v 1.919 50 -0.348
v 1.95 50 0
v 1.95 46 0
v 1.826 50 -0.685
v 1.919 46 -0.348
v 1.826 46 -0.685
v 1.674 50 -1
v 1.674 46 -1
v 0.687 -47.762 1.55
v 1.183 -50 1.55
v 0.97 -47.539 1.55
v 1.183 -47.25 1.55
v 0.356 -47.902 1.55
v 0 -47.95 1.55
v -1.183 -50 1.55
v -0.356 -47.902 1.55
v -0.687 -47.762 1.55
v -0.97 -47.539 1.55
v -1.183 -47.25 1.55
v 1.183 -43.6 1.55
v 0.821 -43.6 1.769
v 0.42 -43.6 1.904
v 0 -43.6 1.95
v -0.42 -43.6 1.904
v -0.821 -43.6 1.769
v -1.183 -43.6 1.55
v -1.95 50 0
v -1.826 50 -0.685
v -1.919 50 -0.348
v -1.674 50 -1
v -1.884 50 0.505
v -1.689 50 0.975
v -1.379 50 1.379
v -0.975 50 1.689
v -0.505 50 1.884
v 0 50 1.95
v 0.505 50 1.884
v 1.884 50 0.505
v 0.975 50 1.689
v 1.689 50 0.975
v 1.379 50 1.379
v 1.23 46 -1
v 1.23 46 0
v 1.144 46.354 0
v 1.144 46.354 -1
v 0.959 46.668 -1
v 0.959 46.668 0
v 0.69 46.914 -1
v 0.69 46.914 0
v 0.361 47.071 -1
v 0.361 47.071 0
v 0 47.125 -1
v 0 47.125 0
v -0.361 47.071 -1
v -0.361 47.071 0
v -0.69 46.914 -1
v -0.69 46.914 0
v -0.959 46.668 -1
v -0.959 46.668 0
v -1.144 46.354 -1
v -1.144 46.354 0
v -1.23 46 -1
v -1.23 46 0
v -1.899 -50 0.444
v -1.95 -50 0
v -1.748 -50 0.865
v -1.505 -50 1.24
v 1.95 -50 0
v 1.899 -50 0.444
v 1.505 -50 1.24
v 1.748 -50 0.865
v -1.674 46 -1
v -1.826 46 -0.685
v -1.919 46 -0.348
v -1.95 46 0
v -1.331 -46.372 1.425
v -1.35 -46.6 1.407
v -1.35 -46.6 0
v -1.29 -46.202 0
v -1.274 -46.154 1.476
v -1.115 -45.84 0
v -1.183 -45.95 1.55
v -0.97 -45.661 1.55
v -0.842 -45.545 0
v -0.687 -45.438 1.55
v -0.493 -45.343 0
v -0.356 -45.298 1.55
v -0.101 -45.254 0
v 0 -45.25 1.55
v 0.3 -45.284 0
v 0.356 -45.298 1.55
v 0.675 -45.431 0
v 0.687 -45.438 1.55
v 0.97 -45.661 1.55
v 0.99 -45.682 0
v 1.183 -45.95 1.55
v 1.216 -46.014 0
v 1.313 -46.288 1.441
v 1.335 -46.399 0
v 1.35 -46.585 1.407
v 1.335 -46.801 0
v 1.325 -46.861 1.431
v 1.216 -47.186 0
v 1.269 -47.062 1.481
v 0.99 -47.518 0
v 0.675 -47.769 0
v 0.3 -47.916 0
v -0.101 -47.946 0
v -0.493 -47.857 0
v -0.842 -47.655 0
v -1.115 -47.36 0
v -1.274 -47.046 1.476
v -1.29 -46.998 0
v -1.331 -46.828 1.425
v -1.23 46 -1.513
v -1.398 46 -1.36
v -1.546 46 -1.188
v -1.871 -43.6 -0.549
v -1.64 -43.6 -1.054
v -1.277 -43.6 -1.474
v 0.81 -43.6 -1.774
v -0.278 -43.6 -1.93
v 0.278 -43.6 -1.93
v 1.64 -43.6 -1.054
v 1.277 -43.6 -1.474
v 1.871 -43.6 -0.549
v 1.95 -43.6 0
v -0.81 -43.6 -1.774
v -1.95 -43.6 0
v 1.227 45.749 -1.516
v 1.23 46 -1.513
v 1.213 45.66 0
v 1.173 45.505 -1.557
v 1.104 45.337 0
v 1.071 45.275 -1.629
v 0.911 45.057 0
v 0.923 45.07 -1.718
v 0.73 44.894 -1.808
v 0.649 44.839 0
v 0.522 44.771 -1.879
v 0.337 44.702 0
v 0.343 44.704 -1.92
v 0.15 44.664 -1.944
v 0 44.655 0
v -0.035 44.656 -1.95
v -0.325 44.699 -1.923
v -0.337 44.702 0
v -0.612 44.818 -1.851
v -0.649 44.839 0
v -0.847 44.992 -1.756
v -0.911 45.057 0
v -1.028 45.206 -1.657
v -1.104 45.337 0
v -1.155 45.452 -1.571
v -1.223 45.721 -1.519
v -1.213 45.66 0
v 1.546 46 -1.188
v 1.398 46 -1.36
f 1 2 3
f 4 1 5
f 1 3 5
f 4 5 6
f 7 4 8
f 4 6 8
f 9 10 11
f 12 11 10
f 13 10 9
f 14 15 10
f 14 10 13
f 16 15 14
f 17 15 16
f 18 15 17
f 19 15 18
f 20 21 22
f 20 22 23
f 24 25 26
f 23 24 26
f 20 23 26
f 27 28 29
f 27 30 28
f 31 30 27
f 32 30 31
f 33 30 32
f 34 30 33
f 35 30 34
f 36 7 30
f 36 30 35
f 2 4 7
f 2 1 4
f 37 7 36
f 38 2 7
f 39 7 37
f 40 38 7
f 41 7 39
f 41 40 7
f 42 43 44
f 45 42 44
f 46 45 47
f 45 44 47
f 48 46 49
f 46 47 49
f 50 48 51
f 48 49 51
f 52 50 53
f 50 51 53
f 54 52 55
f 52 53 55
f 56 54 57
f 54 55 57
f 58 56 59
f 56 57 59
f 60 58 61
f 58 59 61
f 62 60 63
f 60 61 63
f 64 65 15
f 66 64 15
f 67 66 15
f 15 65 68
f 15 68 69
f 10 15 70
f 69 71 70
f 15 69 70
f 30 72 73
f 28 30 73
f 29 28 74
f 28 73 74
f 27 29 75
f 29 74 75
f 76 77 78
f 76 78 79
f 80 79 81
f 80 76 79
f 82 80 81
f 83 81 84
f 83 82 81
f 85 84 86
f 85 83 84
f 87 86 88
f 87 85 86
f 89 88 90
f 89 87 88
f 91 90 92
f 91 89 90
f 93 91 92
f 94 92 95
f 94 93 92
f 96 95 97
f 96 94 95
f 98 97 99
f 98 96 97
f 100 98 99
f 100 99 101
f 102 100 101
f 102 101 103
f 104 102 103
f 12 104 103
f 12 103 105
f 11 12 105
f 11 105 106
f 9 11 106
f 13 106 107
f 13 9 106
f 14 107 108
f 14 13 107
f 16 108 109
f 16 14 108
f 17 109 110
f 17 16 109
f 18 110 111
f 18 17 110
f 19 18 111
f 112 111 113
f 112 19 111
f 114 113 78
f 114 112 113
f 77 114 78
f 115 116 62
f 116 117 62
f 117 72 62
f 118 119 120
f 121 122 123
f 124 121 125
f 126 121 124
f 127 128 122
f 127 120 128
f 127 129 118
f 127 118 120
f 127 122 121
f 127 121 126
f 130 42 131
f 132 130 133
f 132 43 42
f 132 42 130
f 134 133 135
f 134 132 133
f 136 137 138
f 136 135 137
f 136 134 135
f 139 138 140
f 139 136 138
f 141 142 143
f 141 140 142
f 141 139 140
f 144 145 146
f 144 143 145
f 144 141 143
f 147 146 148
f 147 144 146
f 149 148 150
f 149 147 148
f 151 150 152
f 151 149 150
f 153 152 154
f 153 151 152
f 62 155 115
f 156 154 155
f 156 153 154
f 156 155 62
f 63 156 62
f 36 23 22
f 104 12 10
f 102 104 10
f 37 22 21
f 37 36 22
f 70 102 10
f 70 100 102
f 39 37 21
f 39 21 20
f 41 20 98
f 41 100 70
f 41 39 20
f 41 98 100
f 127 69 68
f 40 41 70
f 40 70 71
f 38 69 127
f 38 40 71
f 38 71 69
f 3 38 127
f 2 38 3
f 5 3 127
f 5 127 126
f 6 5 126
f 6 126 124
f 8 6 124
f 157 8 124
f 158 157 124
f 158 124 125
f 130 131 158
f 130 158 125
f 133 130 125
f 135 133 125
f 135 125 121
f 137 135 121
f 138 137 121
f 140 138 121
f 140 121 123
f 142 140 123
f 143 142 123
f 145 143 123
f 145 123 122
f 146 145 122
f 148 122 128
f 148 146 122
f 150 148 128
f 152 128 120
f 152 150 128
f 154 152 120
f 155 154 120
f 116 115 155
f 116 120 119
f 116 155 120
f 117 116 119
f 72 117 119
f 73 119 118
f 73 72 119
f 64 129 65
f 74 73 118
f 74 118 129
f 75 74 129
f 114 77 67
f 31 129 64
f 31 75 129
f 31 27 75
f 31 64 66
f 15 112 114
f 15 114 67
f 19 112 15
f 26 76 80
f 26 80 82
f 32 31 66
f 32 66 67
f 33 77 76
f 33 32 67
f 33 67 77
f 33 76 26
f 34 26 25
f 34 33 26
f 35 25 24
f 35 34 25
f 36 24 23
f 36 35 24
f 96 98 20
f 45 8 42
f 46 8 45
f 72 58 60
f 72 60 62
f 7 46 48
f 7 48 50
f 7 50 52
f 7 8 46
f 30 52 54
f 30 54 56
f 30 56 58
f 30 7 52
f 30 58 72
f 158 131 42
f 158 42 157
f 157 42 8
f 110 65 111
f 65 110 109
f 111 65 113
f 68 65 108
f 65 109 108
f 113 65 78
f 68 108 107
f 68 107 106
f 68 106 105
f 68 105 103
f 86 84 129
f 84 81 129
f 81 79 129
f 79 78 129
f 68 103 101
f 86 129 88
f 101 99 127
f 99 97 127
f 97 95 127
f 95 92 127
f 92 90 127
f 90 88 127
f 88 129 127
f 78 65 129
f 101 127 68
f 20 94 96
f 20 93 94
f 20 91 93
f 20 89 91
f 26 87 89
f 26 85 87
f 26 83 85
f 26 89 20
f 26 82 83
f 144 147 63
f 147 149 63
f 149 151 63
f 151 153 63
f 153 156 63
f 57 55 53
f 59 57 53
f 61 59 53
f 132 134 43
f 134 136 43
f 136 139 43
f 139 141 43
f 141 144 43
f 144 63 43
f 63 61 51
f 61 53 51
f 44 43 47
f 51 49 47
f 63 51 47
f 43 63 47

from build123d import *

# Parameters (mm, degrees)
SKETCH1_R               = 1.95
BOSS_EXTRUDE1_DEPTH     = 50
SKETCH2_W               = 3.9
SKETCH2_H               = 6.4
SKETCH2_H_2             = 4
CUT_EXTRUDE1_DEPTH      = 51.075992252
CUT_EXTRUDE2_DEPTH      = 51.075992252
CUT_EXTRUDE2_DEPTH_BACK = 51.075992252
SKETCH3_W               = 0.4
SKETCH3_H               = 6.4
CUT_EXTRUDE3_DEPTH      = 51.075992252
CUT_EXTRUDE3_DEPTH_BACK = 51.075992252
SKETCH4_R               = 1.35
SKETCH5_R               = 1.235
CUT_EXTRUDE4_DEPTH      = 51.075992359
BOSS_EXTRUDE2_DEPTH     = 1
CUT_EXTRUDE5_DEPTH      = 97.039601311


with BuildPart() as part:
    # Sketch1 → Boss-Extrude1 (new, symmetric)
    with BuildSketch(Plane(origin=(0, 0, 0), x_dir=(1, 0, 0), z_dir=(0, 1, 0))):
        with Locations(Location((0, 0, 0), (0, 0, 270))):
            Circle(SKETCH1_R)
    extrude(amount=BOSS_EXTRUDE1_DEPTH, both=True)

    # Sketch2 → Cut-Extrude1 (cut, through all)
    with BuildSketch(Plane.XY):
        with Locations((0, -46.8)):
            Rectangle(SKETCH2_W, SKETCH2_H)
        with Locations((0, 48)):
            Rectangle(SKETCH2_W, SKETCH2_H_2)
    extrude(amount=-CUT_EXTRUDE1_DEPTH, mode=Mode.SUBTRACT)

    # Sketch3 → Cut-Extrude2 (cut, two sides: drawn at the far end of the back side and taken through both)
    with BuildSketch(Plane(origin=(0, 0, 0), x_dir=(0, 0, -1), z_dir=(1, 0, 0)).offset(-CUT_EXTRUDE2_DEPTH_BACK)):
        with Locations((-1.75, -46.8)):
            Rectangle(SKETCH3_W, SKETCH3_H)
    extrude(amount=CUT_EXTRUDE2_DEPTH + CUT_EXTRUDE2_DEPTH_BACK, mode=Mode.SUBTRACT)

    # Sketch4 → Cut-Extrude3 (cut, two sides: drawn at the far end of the back side and taken through both)
    with BuildSketch(Plane(origin=(0, 0, 0), x_dir=(-1, 0, 0), z_dir=(0, 0, -1)).offset(-CUT_EXTRUDE3_DEPTH_BACK)):
        with Locations((0, -46.6)):
            Circle(SKETCH4_R)
    extrude(amount=CUT_EXTRUDE3_DEPTH + CUT_EXTRUDE3_DEPTH_BACK, mode=Mode.SUBTRACT)

    # Sketch5 → Cut-Extrude4 (cut, through all)
    with BuildSketch(Plane(origin=(0, 0, 0), x_dir=(-1, 0, 0), z_dir=(0, 0, -1))):
        with Locations((0, 45.89)):
            Circle(SKETCH5_R)
    extrude(amount=CUT_EXTRUDE4_DEPTH, mode=Mode.SUBTRACT)

    # Sketch6 → Boss-Extrude2 (add)
    with BuildSketch(Plane(origin=(0, 0, 0), x_dir=(-1, 0, 0), z_dir=(0, 0, -1))):
        with BuildLine():
            Line((-1.95, 46), (-1.23009146, 46))
            ThreePointArc((-1.23009146, 46), (0, 47.125), (1.23009146, 46))
            Line((1.23009146, 46), (1.95, 46))
            Line((1.95, 46), (1.95, 50))
            Line((1.95, 50), (-1.95, 50))
            Line((-1.95, 50), (-1.95, 46))
        make_face()
    extrude(amount=BOSS_EXTRUDE2_DEPTH)

    # Sketch7 → Cut-Extrude5 (cut, through all)
    with BuildSketch(Plane.XZ.offset(-46)):
        with BuildLine():
            Line((1.95, -1), (1.95, 0))
            ThreePointArc((1.95, 0), (1.879751375, -0.518685616), (1.674066904, -1))
            Line((1.674066904, -1), (1.95, -1))
        make_face()
        with BuildLine():
            Line((-1.95, -1), (-1.674066904, -1))
            ThreePointArc((-1.674066904, -1), (-1.879751375, -0.518685616), (-1.95, 0))
            Line((-1.95, 0), (-1.95, -1))
        make_face()
    extrude(amount=-CUT_EXTRUDE5_DEPTH, mode=Mode.SUBTRACT)


solid = part.part
